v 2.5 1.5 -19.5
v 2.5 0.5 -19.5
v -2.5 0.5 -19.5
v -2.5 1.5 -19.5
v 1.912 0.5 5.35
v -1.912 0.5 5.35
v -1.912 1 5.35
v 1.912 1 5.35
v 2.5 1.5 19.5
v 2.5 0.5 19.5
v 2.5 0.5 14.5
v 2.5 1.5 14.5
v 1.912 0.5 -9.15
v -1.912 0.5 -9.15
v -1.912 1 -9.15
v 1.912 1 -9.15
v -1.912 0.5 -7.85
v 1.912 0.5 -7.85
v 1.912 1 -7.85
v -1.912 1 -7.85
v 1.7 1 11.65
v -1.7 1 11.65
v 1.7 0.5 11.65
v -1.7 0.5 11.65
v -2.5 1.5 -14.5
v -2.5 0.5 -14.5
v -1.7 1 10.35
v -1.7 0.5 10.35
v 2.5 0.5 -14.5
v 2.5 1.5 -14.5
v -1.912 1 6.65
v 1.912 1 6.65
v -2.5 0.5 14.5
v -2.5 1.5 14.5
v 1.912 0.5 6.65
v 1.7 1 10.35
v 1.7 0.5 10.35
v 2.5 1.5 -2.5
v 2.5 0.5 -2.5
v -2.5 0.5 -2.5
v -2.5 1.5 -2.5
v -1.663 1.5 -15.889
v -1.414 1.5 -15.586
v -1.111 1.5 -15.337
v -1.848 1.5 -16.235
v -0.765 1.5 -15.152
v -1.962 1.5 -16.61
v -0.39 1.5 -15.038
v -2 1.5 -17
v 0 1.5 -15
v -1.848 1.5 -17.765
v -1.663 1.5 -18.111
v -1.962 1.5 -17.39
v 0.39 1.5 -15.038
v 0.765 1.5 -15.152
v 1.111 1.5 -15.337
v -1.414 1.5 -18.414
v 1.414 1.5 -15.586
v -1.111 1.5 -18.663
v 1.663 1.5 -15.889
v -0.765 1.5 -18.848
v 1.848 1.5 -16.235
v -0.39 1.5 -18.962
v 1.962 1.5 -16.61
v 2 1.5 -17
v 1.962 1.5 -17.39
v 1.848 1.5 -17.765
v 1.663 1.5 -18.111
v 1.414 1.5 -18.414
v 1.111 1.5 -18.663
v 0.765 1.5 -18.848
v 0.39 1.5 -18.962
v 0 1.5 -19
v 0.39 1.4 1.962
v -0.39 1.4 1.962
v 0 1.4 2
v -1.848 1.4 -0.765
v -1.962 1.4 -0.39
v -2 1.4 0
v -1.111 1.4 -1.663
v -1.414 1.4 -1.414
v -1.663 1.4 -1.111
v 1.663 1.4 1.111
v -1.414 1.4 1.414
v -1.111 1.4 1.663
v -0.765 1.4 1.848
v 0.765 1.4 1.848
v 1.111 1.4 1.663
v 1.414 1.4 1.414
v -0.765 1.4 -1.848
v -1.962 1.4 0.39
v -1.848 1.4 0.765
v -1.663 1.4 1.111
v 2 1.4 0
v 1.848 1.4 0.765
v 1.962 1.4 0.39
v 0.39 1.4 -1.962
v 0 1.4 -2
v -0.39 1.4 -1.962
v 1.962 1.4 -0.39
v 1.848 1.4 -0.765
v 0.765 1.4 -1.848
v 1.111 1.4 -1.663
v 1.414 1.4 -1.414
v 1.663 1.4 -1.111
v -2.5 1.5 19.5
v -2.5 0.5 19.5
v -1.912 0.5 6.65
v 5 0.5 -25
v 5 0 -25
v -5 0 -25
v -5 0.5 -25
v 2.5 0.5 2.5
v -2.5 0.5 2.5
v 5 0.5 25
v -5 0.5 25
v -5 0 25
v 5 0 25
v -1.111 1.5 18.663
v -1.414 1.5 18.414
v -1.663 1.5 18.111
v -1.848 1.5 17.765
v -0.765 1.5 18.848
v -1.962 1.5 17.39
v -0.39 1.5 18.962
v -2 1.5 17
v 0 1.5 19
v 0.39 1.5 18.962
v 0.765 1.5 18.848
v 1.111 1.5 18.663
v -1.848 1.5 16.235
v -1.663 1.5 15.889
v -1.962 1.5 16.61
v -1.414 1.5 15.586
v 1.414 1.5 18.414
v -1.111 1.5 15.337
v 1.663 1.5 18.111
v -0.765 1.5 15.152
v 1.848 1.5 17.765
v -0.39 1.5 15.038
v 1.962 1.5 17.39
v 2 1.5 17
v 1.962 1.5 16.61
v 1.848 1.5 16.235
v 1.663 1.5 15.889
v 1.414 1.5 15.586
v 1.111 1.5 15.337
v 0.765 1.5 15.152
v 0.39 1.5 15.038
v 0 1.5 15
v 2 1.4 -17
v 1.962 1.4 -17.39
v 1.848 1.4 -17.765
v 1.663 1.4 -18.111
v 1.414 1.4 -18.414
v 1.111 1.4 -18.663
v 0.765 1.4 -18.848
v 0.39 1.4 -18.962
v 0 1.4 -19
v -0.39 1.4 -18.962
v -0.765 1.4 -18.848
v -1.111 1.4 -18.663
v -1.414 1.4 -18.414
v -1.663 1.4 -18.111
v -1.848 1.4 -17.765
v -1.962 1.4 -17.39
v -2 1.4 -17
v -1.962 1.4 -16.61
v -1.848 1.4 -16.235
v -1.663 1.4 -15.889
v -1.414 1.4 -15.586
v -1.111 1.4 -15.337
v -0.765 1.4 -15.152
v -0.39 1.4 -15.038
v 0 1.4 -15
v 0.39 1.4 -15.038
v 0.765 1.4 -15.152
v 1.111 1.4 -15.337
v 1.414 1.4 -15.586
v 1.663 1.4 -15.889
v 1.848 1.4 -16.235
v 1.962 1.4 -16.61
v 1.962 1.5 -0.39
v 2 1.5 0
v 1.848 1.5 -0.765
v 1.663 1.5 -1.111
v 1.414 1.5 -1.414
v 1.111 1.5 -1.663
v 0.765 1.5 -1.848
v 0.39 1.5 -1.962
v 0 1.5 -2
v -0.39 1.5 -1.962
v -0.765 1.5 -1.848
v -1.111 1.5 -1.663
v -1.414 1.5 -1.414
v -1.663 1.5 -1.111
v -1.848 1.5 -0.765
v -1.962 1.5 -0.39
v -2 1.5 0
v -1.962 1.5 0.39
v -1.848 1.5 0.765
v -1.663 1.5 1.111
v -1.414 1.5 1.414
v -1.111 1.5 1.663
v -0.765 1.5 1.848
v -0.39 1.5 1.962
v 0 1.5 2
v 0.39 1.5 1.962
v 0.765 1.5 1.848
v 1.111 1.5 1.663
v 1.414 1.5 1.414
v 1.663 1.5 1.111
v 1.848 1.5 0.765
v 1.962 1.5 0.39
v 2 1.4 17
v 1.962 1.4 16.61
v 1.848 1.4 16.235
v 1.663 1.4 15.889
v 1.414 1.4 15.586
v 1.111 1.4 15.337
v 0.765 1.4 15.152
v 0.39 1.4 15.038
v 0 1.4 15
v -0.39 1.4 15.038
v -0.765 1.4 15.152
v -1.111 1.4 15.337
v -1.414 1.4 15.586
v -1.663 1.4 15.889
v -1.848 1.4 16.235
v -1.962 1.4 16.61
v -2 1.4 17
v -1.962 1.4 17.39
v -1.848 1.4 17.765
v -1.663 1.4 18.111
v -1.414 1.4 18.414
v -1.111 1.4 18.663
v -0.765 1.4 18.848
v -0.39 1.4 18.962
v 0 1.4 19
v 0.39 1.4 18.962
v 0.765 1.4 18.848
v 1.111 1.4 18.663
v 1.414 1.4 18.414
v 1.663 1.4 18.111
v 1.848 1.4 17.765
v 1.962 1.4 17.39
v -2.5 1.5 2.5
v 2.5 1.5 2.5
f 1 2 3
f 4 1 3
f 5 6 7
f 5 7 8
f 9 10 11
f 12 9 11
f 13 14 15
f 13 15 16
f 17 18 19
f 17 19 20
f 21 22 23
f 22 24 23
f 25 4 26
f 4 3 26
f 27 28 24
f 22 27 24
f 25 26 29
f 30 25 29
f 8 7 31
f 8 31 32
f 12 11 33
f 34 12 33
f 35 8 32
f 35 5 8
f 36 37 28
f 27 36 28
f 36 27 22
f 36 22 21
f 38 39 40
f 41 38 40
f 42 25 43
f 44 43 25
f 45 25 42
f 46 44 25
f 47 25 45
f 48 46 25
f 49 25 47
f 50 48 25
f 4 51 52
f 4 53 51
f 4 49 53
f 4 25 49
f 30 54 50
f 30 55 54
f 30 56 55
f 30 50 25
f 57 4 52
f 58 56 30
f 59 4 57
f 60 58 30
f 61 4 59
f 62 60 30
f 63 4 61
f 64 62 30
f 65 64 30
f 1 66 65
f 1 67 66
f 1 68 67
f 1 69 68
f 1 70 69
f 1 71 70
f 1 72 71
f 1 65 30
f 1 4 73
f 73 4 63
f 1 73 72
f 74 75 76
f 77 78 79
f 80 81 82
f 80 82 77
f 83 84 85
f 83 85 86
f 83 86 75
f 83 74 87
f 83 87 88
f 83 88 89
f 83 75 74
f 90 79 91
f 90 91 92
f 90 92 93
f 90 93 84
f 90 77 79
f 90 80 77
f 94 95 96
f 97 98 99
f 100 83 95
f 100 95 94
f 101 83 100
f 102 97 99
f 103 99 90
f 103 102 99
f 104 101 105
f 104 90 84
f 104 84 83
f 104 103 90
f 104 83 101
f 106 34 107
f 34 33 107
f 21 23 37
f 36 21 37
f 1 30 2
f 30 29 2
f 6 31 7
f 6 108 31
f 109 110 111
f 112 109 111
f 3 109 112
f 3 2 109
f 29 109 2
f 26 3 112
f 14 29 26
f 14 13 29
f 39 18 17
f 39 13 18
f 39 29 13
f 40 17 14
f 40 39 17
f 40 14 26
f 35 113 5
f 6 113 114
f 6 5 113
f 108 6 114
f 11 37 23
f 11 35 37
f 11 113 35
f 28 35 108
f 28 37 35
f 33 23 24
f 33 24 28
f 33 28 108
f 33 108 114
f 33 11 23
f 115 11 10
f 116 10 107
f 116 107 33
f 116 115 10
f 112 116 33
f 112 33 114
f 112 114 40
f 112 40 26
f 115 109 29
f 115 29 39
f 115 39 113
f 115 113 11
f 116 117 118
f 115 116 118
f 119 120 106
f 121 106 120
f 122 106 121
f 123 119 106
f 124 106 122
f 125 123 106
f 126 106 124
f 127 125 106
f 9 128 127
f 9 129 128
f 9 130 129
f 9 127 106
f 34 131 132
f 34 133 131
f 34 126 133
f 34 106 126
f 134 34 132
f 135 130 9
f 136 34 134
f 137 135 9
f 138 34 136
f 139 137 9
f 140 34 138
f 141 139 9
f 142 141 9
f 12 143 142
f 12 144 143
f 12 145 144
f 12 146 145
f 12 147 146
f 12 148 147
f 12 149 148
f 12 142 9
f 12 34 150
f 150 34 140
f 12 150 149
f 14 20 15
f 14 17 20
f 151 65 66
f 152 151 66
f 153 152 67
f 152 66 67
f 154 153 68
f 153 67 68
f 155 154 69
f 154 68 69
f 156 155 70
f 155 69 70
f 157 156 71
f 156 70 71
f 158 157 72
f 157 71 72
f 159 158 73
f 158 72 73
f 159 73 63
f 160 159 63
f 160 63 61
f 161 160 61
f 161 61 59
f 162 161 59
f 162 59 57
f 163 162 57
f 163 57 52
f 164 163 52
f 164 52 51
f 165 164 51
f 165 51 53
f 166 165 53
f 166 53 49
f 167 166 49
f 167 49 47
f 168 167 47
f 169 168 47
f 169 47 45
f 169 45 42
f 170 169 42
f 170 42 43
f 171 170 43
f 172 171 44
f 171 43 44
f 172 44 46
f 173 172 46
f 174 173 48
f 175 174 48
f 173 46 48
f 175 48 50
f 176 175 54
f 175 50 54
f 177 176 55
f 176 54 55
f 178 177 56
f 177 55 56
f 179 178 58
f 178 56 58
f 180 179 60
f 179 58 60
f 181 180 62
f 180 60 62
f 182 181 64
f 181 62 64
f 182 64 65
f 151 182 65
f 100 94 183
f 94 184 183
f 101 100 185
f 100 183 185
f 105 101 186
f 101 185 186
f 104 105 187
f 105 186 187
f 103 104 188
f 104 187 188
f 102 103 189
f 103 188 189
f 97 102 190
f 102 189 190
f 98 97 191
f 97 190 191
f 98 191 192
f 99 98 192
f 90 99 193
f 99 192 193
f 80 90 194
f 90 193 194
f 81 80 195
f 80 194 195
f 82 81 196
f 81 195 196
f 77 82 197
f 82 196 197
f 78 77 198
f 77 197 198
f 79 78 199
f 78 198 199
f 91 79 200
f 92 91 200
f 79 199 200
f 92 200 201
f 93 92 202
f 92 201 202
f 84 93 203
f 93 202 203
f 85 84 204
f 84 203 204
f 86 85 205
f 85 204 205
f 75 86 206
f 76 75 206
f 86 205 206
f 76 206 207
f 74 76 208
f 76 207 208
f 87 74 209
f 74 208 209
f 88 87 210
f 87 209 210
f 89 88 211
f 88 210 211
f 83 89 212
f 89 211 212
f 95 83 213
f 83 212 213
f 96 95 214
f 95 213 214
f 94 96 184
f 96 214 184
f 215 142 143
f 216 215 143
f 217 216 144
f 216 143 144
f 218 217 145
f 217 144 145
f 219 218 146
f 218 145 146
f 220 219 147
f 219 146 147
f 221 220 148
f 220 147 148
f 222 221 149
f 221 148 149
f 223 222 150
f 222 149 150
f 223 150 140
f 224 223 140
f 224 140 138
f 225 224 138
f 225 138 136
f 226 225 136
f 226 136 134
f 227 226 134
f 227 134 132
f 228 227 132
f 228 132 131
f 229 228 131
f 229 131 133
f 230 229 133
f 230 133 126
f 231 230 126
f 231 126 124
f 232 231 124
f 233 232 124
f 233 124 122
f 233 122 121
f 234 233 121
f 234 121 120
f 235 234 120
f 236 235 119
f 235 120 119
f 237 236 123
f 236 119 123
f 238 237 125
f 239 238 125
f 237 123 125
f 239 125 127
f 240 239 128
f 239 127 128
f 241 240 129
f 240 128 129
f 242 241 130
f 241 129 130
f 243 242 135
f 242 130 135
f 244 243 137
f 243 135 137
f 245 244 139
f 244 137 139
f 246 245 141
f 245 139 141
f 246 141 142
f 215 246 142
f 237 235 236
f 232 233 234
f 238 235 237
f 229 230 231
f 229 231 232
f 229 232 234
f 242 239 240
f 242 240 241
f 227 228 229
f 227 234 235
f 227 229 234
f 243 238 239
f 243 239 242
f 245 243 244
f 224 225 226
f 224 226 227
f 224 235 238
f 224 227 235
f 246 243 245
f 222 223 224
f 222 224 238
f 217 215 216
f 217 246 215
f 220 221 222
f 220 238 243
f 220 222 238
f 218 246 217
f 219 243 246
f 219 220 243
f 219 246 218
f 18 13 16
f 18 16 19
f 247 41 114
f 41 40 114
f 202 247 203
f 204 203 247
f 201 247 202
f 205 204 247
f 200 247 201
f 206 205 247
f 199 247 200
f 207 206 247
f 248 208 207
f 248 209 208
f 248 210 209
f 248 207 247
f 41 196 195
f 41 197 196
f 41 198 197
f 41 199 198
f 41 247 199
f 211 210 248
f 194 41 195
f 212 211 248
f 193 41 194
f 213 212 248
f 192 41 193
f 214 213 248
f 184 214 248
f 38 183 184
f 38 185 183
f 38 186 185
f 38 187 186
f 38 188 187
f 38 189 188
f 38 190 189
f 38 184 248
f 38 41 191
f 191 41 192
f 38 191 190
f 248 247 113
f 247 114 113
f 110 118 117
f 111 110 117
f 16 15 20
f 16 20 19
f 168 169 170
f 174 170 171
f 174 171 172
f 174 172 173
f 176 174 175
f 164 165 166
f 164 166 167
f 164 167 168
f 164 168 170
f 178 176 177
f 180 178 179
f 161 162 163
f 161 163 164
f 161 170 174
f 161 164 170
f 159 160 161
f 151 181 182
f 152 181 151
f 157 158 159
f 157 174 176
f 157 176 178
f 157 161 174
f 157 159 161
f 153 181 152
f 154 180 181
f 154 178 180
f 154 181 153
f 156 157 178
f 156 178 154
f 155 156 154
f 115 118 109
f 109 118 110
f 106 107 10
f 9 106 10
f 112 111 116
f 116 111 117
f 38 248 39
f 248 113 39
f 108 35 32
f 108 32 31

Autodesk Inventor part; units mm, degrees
ref_plane "YZ Plane" through (0, 0, 0) normal (1, 0, 0) x (0, 1, 0)
ref_plane "XZ Plane" through (0, 0, 0) normal (0, 1, 0) x (-1, 0, 0)
ref_plane "XY Plane" through (0, 0, 0) normal (0, 0, 1) x (1, 0, 0)
sketch "Sketch1" plane through (0, 0, 0) normal (0, 1, 0) x (-1, 0, 0)
  line L0 (-5, 25) -> (-5, -25)
  line L1 (-5, -25) -> (5, -25)
  line L2 (5, -25) -> (5, 25)
  line L3 (5, 25) -> (-5, 25)
  line L4 (-5, 25) -> (5, -25) construction
  line L5 (-5, -25) -> (5, 25) construction
  point P0 (0, 0)
  dimension "d0" = 50
  dimension "d1" = 10
extrude "Extrusion1" add sketch "Sketch1" along normal blind 0.5
sketch "Sketch2" plane through (0, 0.5, 0) normal (0, 1, 0) x (1, 0, 0)
  line L0 (2.5, -2.5) -> (2.5, 2.5)
  line L1 (2.5, 2.5) -> (-2.5, 2.5)
  line L2 (-2.5, 2.5) -> (-2.5, -2.5)
  line L3 (-2.5, -2.5) -> (2.5, -2.5)
  line L4 (2.5, -2.5) -> (-2.5, 2.5) construction
  line L5 (2.5, 2.5) -> (-2.5, -2.5) construction
  line L6 (-5, -25) -> (5, -25) projected
  line L7 (0, -25) -> (0, -17)
  line L8 (2.5, -19.5) -> (2.5, -14.5)
  line L9 (2.5, -14.5) -> (-2.5, -14.5)
  line L10 (-2.5, -14.5) -> (-2.5, -19.5)
  line L11 (-2.5, -19.5) -> (2.5, -19.5)
  line L12 (2.5, -19.5) -> (-2.5, -14.5) construction
  line L13 (2.5, -14.5) -> (-2.5, -19.5) construction
  line L14 (5, 25) -> (-5, 25) projected
  line L15 (0, 25) -> (0, 17)
  line L16 (2.5, 14.5) -> (2.5, 19.5)
  line L17 (2.5, 19.5) -> (-2.5, 19.5)
  line L18 (-2.5, 19.5) -> (-2.5, 14.5)
  line L19 (-2.5, 14.5) -> (2.5, 14.5)
  line L20 (2.5, 14.5) -> (-2.5, 19.5) construction
  line L21 (2.5, 19.5) -> (-2.5, 14.5) construction
  point P0 (0, 0)
  dimension "d4" = 5
  dimension "d5" = 5
  dimension "d6" = 8
  dimension "d7" = 5
  dimension "d8" = 5
  dimension "d9" = 8
  dimension "d10" = 5
extrude "Extrusion2" add sketch "Sketch2" along normal blind 1
sketch "Sketch3" plane through (0, 0.5, 0) normal (0, 1, 0) x (1, 0, 0)
  line L0 (-5, -25) -> (5, -25) projected
  line L1 (0, -25) -> (0, -11)
  line L2 (1.7, -11.65) -> (1.7, -10.35)
  line L3 (1.7, -10.35) -> (-1.7, -10.35)
  line L4 (-1.7, -10.35) -> (-1.7, -11.65)
  line L5 (-1.7, -11.65) -> (1.7, -11.65)
  line L6 (1.7, -11.65) -> (-1.7, -10.35) construction
  line L7 (1.7, -10.35) -> (-1.7, -11.65) construction
  line L8 (0, -11) -> (0, -6)
  line L9 (1.9118, -6.65) -> (-1.9118, -6.65)
  line L10 (-1.9118, -6.65) -> (-1.9118, -5.35)
  line L11 (-1.9118, -5.35) -> (1.9118, -5.35)
  line L12 (1.9118, -5.35) -> (1.9118, -6.65)
  line L13 (1.9118, -6.65) -> (-1.9118, -5.35) construction
  line L14 (-1.9118, -6.65) -> (1.9118, -5.35) construction
  line L15 (2.5, 2.5) -> (-2.5, 2.5) projected
  line L16 (0, 2.5) -> (0, 8.5)
  line L17 (1.9118, 7.85) -> (-1.9118, 7.85)
  line L18 (-1.9118, 7.85) -> (-1.9118, 9.15)
  line L19 (-1.9118, 9.15) -> (1.9118, 9.15)
  line L20 (1.9118, 9.15) -> (1.9118, 7.85)
  line L21 (1.9118, 7.85) -> (-1.9118, 9.15) construction
  line L22 (-1.9118, 7.85) -> (1.9118, 9.15) construction
  point P0 (0, 0)
  dimension "d13" = 14
  dimension "d14" = 1.3
  dimension "d15" = 3.4
  dimension "d16" = 5
  dimension "d17" = 1.3
  dimension "d18" = 6
  dimension "d19" = 1.3
extrude "Extrusion3" add sketch "Sketch3" along normal blind 0.5
sketch "Sketch4" plane through (0, 1.5, 0) normal (0, 1, 0) x (1, 0, 0)
  circle A0 centre (0, 0) radius 2
  circle A1 centre (0, -17) radius 2
  circle A2 centre (0, 17) radius 2
  dimension "d22" = 4
  dimension "d23" = 4
  dimension "d24" = 4
extrude "Extrusion4" cut sketch "Sketch4" against normal blind 0.1
properties part number "5050-led-strip"
